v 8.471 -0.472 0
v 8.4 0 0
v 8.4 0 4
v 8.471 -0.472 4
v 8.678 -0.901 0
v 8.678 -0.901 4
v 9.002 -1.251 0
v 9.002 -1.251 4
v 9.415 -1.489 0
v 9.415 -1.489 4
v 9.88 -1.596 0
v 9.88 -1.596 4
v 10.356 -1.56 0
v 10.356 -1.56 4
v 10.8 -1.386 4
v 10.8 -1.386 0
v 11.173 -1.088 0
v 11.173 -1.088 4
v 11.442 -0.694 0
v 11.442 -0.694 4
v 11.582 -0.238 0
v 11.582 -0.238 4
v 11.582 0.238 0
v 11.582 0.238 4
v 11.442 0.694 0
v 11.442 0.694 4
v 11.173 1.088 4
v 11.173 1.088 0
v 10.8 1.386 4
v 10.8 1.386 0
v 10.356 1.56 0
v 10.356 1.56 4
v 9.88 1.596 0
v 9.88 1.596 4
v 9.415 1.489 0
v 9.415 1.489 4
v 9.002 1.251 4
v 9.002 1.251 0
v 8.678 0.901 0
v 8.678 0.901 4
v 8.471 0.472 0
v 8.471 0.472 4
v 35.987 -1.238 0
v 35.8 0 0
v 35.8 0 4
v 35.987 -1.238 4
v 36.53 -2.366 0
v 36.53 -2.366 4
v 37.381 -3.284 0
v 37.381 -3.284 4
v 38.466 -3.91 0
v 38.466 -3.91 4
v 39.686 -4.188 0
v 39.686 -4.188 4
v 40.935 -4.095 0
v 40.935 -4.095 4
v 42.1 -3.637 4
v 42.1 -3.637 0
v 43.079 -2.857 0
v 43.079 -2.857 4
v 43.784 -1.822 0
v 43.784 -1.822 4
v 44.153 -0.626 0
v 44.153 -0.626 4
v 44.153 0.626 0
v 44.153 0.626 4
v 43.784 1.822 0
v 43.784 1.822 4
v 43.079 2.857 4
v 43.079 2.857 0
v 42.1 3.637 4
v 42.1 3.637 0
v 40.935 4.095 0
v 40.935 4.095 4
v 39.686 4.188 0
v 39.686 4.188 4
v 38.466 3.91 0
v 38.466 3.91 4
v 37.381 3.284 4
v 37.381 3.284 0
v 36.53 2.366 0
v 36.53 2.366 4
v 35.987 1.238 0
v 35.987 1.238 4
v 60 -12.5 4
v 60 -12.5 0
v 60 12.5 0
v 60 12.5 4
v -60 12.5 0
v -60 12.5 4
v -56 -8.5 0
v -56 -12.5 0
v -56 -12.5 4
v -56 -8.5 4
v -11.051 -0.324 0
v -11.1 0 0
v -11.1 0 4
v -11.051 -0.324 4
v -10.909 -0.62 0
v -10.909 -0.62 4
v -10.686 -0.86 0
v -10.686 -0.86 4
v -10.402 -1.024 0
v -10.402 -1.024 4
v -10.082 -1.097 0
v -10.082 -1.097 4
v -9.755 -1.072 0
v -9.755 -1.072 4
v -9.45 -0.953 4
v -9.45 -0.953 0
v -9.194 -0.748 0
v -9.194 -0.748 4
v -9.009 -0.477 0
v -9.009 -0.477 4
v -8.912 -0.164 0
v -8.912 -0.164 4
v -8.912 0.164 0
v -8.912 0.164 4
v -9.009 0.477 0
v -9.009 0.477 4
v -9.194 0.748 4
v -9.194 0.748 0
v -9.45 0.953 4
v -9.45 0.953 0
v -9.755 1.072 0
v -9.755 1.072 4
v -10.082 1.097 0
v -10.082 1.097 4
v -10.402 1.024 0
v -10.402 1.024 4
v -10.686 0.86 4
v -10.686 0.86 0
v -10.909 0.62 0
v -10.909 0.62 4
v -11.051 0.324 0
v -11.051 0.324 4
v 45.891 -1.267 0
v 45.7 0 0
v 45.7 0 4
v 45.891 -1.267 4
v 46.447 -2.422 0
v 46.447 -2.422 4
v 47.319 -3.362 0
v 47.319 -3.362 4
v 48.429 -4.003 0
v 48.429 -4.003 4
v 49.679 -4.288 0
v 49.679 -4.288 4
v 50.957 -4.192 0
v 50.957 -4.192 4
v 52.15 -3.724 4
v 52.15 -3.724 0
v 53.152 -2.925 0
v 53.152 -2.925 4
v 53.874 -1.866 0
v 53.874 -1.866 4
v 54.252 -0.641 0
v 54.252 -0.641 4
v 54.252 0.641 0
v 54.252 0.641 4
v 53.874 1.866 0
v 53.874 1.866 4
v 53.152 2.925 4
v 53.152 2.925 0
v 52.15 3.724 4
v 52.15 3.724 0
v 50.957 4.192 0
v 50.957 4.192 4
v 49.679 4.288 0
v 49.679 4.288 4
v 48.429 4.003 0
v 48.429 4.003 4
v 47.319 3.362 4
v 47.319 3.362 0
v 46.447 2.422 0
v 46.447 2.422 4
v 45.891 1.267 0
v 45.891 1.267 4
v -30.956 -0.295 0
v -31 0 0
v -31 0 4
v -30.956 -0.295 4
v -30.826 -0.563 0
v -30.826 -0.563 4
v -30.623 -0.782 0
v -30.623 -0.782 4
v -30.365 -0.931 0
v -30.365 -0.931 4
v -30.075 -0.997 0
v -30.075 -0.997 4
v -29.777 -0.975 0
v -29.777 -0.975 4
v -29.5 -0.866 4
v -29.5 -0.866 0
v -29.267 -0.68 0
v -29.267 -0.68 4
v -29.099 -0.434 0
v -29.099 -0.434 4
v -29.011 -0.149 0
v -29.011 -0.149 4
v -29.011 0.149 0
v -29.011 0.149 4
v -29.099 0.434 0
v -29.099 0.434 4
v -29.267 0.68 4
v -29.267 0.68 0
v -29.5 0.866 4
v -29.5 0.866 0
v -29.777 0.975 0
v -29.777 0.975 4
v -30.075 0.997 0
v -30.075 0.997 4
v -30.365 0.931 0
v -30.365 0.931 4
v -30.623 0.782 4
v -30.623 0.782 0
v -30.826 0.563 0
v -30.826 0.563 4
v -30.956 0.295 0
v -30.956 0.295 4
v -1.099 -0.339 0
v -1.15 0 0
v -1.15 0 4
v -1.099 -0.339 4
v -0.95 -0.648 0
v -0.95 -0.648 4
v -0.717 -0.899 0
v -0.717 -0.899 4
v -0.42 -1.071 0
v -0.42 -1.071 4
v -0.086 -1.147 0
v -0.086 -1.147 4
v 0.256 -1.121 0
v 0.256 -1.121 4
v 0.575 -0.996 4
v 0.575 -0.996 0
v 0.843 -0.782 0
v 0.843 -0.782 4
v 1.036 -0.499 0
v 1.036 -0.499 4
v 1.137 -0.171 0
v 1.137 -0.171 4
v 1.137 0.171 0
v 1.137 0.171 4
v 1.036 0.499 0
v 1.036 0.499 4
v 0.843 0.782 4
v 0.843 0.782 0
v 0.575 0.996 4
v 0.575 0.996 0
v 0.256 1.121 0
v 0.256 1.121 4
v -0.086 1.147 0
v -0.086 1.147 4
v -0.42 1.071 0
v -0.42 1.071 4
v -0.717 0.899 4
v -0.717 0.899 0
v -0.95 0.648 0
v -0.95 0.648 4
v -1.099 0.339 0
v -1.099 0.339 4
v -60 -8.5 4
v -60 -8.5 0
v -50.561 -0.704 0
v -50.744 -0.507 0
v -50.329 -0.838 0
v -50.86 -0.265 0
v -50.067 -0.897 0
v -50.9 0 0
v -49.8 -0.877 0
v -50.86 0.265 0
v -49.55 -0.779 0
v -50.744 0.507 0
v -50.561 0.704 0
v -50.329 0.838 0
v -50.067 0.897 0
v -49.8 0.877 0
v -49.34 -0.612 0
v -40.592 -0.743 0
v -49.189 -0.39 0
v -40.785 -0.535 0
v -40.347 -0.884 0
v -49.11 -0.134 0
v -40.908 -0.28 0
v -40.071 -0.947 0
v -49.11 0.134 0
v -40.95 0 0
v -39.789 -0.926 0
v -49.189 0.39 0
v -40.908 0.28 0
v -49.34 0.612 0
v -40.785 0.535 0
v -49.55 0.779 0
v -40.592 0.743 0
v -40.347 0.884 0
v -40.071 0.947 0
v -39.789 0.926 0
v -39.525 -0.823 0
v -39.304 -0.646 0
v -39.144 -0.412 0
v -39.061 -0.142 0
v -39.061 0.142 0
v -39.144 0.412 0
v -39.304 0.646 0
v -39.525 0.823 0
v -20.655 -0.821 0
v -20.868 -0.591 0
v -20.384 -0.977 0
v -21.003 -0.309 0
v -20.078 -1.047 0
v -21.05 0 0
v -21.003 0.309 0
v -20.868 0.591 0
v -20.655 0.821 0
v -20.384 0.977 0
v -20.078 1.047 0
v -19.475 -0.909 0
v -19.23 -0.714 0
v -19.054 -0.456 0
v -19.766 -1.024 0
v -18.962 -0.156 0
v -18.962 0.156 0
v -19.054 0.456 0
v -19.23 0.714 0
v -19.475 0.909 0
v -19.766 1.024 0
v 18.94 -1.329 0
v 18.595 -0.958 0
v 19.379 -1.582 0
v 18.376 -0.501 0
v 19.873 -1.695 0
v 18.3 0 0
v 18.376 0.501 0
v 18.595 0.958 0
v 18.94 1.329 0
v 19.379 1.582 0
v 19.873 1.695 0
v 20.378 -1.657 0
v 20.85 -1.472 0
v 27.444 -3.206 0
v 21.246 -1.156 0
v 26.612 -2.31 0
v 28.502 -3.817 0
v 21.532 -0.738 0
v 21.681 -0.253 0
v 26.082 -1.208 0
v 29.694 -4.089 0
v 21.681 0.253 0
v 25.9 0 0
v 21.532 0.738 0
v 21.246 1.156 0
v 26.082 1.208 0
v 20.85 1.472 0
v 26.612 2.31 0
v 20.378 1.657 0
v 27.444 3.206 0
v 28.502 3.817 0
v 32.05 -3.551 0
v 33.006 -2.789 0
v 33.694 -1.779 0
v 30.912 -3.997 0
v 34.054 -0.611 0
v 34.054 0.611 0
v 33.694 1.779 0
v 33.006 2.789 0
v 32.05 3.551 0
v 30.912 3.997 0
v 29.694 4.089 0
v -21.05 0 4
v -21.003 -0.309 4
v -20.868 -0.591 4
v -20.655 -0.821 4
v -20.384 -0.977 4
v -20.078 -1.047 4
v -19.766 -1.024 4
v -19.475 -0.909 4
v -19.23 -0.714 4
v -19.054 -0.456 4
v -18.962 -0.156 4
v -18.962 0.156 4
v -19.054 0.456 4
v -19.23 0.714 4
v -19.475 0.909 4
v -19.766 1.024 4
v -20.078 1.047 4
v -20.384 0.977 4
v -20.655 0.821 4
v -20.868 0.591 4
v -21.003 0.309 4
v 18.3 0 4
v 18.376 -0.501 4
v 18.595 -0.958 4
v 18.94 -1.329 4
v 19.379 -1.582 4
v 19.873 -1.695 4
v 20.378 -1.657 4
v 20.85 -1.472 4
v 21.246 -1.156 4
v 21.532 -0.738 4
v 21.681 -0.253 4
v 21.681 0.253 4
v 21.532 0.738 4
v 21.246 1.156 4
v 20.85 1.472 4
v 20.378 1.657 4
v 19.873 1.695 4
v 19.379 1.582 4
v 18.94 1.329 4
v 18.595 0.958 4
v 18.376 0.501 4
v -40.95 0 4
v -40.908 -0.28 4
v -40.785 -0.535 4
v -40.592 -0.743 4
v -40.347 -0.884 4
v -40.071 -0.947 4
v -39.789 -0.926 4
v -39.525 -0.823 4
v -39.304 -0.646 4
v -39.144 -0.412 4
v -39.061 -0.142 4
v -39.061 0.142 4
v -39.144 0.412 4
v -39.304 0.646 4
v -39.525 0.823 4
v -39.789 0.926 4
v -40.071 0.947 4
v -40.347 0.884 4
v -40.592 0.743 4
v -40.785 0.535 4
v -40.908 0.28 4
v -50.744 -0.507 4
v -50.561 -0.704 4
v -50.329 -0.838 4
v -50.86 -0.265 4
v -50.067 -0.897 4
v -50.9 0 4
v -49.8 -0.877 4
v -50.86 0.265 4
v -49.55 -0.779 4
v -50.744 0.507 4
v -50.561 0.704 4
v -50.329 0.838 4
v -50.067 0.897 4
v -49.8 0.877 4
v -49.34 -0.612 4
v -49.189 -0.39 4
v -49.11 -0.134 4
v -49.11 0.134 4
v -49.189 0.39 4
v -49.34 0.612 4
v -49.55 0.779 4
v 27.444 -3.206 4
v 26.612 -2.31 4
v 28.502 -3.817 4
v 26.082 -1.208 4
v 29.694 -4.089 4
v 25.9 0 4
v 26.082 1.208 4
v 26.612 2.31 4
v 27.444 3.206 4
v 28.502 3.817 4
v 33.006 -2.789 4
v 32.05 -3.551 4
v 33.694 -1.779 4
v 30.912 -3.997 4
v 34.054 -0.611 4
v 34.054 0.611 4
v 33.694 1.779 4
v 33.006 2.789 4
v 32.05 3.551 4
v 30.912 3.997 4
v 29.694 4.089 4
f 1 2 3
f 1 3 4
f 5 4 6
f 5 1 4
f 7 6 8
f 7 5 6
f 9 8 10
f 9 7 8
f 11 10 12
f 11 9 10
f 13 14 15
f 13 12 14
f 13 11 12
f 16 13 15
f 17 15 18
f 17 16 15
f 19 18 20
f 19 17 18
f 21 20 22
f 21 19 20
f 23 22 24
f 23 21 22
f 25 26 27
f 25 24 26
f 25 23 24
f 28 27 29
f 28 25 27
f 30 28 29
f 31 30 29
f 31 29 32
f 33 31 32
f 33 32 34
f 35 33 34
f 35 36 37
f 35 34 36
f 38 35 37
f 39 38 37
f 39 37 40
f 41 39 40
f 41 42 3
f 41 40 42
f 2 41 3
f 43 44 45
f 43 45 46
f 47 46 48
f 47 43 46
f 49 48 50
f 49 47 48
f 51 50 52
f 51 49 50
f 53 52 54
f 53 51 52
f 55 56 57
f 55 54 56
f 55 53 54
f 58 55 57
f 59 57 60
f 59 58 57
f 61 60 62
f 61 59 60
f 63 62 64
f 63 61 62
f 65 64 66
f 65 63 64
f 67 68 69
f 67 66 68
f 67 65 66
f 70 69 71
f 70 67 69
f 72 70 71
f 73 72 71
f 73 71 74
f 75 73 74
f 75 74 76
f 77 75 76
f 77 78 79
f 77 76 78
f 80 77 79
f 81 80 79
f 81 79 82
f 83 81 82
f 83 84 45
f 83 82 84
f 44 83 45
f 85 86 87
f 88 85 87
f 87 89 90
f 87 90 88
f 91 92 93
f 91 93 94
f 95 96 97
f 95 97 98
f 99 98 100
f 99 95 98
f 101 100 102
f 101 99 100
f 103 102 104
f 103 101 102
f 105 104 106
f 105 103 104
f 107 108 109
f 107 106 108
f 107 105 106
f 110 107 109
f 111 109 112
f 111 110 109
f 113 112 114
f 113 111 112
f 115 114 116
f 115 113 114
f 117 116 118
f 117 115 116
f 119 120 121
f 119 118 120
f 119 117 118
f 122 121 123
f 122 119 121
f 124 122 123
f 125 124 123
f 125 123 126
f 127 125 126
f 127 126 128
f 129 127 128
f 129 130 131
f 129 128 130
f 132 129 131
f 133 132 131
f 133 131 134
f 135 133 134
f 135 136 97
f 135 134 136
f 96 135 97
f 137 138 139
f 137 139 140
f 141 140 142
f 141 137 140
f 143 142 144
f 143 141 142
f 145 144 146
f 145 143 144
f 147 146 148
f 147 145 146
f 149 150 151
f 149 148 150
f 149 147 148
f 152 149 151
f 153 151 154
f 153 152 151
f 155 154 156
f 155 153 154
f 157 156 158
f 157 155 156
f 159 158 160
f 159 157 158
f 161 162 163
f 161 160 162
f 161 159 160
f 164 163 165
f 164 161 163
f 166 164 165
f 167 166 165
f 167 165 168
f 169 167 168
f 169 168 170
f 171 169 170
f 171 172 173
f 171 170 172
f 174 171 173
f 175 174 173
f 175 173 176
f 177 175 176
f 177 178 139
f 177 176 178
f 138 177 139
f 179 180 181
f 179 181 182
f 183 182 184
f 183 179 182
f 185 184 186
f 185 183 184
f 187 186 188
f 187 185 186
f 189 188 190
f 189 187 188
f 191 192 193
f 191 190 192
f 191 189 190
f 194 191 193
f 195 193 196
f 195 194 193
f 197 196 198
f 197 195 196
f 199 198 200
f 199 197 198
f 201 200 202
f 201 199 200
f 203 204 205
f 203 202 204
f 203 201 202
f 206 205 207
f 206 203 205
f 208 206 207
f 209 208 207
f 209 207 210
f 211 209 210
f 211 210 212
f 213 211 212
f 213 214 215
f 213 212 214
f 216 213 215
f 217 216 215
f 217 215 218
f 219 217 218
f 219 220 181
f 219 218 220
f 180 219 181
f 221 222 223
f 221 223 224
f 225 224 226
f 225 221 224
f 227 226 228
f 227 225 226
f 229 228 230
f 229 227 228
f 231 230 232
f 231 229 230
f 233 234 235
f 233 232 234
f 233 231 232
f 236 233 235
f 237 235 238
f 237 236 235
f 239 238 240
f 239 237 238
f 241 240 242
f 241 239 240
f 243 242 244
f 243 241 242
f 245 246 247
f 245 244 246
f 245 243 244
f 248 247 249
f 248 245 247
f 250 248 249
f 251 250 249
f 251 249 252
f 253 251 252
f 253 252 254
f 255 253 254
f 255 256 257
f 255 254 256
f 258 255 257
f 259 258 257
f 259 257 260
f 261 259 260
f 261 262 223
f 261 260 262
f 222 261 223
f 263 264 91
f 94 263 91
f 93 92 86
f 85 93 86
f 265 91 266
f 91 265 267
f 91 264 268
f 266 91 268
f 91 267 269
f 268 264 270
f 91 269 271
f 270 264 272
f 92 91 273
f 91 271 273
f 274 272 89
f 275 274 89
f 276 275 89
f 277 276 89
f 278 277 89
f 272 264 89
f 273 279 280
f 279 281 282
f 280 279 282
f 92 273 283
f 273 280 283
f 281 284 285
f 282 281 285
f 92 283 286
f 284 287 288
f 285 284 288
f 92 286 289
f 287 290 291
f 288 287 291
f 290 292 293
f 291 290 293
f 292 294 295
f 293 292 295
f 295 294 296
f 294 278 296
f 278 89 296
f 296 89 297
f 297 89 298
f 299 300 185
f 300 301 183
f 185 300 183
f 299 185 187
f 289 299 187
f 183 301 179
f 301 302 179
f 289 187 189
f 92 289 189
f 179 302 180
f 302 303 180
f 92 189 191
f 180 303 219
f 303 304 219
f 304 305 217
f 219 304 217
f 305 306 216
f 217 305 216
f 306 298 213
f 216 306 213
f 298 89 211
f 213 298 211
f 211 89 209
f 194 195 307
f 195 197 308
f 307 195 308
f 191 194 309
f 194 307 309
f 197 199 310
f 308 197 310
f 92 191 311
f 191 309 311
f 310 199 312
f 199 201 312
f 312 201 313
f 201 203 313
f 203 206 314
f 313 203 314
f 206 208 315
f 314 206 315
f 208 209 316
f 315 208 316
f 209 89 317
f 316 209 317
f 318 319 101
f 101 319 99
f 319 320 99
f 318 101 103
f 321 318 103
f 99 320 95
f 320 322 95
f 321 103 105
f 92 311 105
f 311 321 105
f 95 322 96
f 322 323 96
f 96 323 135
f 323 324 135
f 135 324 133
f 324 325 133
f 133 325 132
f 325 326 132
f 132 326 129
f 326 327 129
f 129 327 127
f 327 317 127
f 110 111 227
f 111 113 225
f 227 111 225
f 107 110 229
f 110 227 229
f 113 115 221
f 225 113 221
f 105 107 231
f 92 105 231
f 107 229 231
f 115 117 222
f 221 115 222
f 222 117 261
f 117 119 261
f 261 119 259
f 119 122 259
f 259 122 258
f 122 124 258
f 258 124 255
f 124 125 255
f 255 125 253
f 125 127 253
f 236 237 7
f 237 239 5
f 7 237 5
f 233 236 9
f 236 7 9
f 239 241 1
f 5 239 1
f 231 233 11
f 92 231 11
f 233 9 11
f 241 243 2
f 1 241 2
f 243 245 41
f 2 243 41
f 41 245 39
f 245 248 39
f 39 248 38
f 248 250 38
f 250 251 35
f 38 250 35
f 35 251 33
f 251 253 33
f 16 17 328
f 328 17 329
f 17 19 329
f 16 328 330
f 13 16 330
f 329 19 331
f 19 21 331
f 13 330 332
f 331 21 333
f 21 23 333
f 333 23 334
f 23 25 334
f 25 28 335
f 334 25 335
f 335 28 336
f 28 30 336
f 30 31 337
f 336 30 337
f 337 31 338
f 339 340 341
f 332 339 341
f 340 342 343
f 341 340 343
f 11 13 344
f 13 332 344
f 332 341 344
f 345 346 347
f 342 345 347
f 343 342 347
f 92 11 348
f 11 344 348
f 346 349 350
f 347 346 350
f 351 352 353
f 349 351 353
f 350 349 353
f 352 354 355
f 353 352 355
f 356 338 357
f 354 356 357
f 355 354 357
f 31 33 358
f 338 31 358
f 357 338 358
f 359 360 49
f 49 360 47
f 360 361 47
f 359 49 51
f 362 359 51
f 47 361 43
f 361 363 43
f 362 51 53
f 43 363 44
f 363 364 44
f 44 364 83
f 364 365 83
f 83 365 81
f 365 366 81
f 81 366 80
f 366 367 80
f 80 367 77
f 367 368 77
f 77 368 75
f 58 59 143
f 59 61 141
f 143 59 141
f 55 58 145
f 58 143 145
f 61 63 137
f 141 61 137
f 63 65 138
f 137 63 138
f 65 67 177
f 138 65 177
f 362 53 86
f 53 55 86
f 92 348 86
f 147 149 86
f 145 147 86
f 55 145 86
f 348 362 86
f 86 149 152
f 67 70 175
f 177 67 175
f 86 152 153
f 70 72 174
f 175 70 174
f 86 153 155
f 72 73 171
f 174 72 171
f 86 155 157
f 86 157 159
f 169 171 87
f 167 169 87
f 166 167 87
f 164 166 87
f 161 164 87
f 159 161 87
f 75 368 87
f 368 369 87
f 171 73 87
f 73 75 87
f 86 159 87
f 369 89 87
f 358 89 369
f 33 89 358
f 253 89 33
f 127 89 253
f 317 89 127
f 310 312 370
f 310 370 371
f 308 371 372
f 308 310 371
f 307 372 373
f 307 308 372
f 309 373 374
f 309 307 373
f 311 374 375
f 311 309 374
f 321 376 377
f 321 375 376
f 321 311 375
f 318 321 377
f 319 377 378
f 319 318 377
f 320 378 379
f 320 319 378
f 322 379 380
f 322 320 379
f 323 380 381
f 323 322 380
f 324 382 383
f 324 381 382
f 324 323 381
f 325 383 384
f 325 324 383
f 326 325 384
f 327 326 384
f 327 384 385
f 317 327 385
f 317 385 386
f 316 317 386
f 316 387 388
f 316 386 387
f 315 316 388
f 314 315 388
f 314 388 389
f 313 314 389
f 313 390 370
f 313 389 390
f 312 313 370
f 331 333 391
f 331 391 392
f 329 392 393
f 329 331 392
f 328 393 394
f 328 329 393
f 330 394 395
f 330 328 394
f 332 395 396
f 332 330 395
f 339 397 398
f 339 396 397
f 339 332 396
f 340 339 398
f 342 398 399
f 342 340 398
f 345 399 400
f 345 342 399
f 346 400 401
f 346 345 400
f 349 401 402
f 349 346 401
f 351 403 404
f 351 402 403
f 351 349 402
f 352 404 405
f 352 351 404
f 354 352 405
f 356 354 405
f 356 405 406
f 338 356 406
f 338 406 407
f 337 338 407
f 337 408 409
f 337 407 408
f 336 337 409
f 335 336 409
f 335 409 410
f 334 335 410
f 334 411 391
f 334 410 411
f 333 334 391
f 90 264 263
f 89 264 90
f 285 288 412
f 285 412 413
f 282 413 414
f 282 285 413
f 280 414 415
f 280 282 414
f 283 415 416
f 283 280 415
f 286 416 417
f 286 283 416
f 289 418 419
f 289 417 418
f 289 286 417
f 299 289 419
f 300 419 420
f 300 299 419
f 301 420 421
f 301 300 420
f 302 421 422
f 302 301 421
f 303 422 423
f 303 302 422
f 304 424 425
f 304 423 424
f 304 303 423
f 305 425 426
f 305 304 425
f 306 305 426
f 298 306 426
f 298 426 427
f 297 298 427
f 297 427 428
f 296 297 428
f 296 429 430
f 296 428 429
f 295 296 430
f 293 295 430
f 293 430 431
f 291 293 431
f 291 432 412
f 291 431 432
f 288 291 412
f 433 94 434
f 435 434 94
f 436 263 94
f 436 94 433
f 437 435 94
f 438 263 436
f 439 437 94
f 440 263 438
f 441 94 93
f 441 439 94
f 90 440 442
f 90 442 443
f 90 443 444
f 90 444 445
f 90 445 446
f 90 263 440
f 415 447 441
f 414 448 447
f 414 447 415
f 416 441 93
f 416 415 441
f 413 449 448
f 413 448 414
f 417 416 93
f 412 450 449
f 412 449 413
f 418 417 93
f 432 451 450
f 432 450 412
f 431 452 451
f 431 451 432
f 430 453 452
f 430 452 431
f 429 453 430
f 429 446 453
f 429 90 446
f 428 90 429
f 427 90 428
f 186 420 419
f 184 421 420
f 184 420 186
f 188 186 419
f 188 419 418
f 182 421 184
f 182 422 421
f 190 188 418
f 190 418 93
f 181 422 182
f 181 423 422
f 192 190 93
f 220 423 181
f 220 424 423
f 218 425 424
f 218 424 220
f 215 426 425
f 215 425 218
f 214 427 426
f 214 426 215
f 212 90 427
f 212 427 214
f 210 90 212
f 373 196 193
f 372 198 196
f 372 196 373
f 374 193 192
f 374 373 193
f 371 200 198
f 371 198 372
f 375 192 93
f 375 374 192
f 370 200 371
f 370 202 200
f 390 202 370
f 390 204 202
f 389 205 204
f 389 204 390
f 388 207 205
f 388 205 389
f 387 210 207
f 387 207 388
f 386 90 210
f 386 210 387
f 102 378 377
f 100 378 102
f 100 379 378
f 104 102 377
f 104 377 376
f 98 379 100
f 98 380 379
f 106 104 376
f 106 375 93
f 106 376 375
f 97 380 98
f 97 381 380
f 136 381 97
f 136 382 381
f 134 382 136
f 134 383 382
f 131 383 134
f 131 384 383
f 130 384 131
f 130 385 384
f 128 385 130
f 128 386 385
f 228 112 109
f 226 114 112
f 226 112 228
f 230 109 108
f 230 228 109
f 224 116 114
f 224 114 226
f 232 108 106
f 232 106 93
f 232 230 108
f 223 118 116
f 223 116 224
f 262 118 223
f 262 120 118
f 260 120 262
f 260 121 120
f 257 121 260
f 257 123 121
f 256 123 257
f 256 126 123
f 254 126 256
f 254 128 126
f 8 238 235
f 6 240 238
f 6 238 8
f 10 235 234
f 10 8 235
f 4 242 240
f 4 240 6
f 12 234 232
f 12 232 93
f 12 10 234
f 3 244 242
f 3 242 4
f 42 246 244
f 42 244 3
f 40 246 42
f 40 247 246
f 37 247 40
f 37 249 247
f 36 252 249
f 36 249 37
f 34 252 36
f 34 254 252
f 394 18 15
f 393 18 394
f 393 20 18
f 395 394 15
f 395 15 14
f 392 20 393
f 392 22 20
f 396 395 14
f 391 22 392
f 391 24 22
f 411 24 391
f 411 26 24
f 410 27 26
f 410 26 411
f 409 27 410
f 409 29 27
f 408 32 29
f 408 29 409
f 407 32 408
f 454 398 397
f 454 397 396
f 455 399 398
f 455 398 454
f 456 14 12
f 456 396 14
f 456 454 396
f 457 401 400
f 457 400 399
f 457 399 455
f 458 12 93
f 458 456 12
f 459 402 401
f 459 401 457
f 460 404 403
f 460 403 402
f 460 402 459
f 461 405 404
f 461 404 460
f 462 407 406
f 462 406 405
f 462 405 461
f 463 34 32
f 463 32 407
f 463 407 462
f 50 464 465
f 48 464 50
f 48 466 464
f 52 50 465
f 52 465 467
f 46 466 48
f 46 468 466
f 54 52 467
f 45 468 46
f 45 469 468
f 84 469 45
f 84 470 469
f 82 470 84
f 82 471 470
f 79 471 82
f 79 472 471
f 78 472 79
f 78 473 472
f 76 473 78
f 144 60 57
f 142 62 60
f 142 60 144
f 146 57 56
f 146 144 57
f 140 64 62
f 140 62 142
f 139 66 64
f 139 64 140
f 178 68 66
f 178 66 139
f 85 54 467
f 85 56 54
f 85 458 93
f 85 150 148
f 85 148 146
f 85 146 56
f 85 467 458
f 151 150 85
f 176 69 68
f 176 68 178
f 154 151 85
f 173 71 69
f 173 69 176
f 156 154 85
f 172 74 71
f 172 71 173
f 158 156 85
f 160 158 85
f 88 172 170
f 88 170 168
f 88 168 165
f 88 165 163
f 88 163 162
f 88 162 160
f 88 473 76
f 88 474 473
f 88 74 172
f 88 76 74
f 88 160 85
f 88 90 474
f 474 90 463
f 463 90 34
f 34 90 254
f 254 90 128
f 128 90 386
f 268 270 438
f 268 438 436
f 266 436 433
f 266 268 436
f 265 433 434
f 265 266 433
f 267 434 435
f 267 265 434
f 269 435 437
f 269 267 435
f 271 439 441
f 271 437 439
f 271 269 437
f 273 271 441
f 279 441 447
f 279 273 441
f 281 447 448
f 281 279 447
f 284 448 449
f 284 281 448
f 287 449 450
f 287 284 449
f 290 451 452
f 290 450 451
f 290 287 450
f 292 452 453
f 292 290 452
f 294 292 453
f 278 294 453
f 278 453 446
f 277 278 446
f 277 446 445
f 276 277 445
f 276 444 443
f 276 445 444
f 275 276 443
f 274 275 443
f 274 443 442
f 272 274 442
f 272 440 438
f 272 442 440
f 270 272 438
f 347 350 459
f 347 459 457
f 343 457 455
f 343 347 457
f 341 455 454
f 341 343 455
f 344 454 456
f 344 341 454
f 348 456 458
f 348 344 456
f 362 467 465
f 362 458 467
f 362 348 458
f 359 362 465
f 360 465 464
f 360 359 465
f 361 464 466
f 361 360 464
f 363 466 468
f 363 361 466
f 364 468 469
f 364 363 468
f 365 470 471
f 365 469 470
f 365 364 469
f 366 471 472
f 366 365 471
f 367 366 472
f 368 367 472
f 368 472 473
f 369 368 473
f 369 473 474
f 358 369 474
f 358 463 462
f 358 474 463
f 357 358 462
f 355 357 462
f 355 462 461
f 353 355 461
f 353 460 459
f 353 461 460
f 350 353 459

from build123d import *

# Parameters (mm, degrees)
SKETCH1_W               = 120
SKETCH1_H               = 25
COUPON_120X25_DEPTH     = 4
DIAMETER_1P8_START      = -0.1
SKETCH2_R               = 0.9
DIAMETER_1P8_DEPTH      = 4.2
DIAMETER_1P9_START      = -0.1
SKETCH3_R               = 0.95
DIAMETER_1P9_DEPTH      = 4.2
DIAMETER_2_START        = -0.1
SKETCH4_R               = 1
DIAMETER_2_DEPTH        = 4.2
DIAMETER_2P1_START      = -0.1
SKETCH5_R               = 1.05
DIAMETER_2P1_DEPTH      = 4.2
DIAMETER_2P2_START      = -0.1
SKETCH6_R               = 1.1
DIAMETER_2P2_DEPTH      = 4.2
DIAMETER_2P3_START      = -0.1
SKETCH7_R               = 1.15
DIAMETER_2P3_DEPTH      = 4.2
DIAMETER_3P2_START      = -0.1
SKETCH8_R               = 1.6
DIAMETER_3P2_DEPTH      = 4.2
DIAMETER_3P4_START      = -0.1
SKETCH9_R               = 1.7
DIAMETER_3P4_DEPTH      = 4.2
DIAMETER_8P2_START      = -0.1
SKETCH10_R              = 4.1
DIAMETER_8P2_DEPTH      = 4.2
DIAMETER_8P4_START      = -0.1
SKETCH11_R              = 4.2
DIAMETER_8P4_DEPTH      = 4.2
DIAMETER_8P6_START      = -0.1
SKETCH12_R              = 4.3
DIAMETER_8P6_DEPTH      = 4.2
ORIENTATION_NOTCH_START = -0.1
SKETCH13_W              = 4
SKETCH13_H              = 4
ORIENTATION_NOTCH_DEPTH = 4.2


with BuildPart() as part:
    # Sketch1 → Coupon_120x25 (new body)
    with BuildSketch(Plane.XY):
        Rectangle(SKETCH1_W, SKETCH1_H)
    extrude(amount=COUPON_120X25_DEPTH)

    # Sketch2 → Diameter_1p8 (cut)
    with BuildSketch(Plane.XY.offset(DIAMETER_1P8_START)):
        with Locations(Location((-50, 0, 0), (0, 0, 180))):
            Circle(SKETCH2_R)
    extrude(amount=DIAMETER_1P8_DEPTH, mode=Mode.SUBTRACT)

    # Sketch3 → Diameter_1p9 (cut)
    with BuildSketch(Plane.XY.offset(DIAMETER_1P9_START)):
        with Locations(Location((-40, 0, 0), (0, 0, 180))):
            Circle(SKETCH3_R)
    extrude(amount=DIAMETER_1P9_DEPTH, mode=Mode.SUBTRACT)

    # Sketch4 → Diameter_2 (cut)
    with BuildSketch(Plane.XY.offset(DIAMETER_2_START)):
        with Locations(Location((-30, 0, 0), (0, 0, 180))):
            Circle(SKETCH4_R)
    extrude(amount=DIAMETER_2_DEPTH, mode=Mode.SUBTRACT)

    # Sketch5 → Diameter_2p1 (cut)
    with BuildSketch(Plane.XY.offset(DIAMETER_2P1_START)):
        with Locations(Location((-20, 0, 0), (0, 0, 180))):
            Circle(SKETCH5_R)
    extrude(amount=DIAMETER_2P1_DEPTH, mode=Mode.SUBTRACT)

    # Sketch6 → Diameter_2p2 (cut)
    with BuildSketch(Plane.XY.offset(DIAMETER_2P2_START)):
        with Locations(Location((-10, 0, 0), (0, 0, 180))):
            Circle(SKETCH6_R)
    extrude(amount=DIAMETER_2P2_DEPTH, mode=Mode.SUBTRACT)

    # Sketch7 → Diameter_2p3 (cut)
    with BuildSketch(Plane.XY.offset(DIAMETER_2P3_START)):
        with Locations(Location((0, 0, 0), (0, 0, 180))):
            Circle(SKETCH7_R)
    extrude(amount=DIAMETER_2P3_DEPTH, mode=Mode.SUBTRACT)

    # Sketch8 → Diameter_3p2 (cut)
    with BuildSketch(Plane.XY.offset(DIAMETER_3P2_START)):
        with Locations(Location((10, 0, 0), (0, 0, 180))):
            Circle(SKETCH8_R)
    extrude(amount=DIAMETER_3P2_DEPTH, mode=Mode.SUBTRACT)

    # Sketch9 → Diameter_3p4 (cut)
    with BuildSketch(Plane.XY.offset(DIAMETER_3P4_START)):
        with Locations(Location((20, 0, 0), (0, 0, 180))):
            Circle(SKETCH9_R)
    extrude(amount=DIAMETER_3P4_DEPTH, mode=Mode.SUBTRACT)

    # Sketch10 → Diameter_8p2 (cut)
    with BuildSketch(Plane.XY.offset(DIAMETER_8P2_START)):
        with Locations(Location((30, 0, 0), (0, 0, 180))):
            Circle(SKETCH10_R)
    extrude(amount=DIAMETER_8P2_DEPTH, mode=Mode.SUBTRACT)

    # Sketch11 → Diameter_8p4 (cut)
    with BuildSketch(Plane.XY.offset(DIAMETER_8P4_START)):
        with Locations(Location((40, 0, 0), (0, 0, 180))):
            Circle(SKETCH11_R)
    extrude(amount=DIAMETER_8P4_DEPTH, mode=Mode.SUBTRACT)

    # Sketch12 → Diameter_8p6 (cut)
    with BuildSketch(Plane.XY.offset(DIAMETER_8P6_START)):
        with Locations(Location((50, 0, 0), (0, 0, 180))):
            Circle(SKETCH12_R)
    extrude(amount=DIAMETER_8P6_DEPTH, mode=Mode.SUBTRACT)

    # Sketch13 → Orientation_Notch (cut)
    with BuildSketch(Plane.XY.offset(ORIENTATION_NOTCH_START)):
        with Locations((-58, -10.5)):
            Rectangle(SKETCH13_W, SKETCH13_H)
    extrude(amount=ORIENTATION_NOTCH_DEPTH, mode=Mode.SUBTRACT)


solid = part.part
